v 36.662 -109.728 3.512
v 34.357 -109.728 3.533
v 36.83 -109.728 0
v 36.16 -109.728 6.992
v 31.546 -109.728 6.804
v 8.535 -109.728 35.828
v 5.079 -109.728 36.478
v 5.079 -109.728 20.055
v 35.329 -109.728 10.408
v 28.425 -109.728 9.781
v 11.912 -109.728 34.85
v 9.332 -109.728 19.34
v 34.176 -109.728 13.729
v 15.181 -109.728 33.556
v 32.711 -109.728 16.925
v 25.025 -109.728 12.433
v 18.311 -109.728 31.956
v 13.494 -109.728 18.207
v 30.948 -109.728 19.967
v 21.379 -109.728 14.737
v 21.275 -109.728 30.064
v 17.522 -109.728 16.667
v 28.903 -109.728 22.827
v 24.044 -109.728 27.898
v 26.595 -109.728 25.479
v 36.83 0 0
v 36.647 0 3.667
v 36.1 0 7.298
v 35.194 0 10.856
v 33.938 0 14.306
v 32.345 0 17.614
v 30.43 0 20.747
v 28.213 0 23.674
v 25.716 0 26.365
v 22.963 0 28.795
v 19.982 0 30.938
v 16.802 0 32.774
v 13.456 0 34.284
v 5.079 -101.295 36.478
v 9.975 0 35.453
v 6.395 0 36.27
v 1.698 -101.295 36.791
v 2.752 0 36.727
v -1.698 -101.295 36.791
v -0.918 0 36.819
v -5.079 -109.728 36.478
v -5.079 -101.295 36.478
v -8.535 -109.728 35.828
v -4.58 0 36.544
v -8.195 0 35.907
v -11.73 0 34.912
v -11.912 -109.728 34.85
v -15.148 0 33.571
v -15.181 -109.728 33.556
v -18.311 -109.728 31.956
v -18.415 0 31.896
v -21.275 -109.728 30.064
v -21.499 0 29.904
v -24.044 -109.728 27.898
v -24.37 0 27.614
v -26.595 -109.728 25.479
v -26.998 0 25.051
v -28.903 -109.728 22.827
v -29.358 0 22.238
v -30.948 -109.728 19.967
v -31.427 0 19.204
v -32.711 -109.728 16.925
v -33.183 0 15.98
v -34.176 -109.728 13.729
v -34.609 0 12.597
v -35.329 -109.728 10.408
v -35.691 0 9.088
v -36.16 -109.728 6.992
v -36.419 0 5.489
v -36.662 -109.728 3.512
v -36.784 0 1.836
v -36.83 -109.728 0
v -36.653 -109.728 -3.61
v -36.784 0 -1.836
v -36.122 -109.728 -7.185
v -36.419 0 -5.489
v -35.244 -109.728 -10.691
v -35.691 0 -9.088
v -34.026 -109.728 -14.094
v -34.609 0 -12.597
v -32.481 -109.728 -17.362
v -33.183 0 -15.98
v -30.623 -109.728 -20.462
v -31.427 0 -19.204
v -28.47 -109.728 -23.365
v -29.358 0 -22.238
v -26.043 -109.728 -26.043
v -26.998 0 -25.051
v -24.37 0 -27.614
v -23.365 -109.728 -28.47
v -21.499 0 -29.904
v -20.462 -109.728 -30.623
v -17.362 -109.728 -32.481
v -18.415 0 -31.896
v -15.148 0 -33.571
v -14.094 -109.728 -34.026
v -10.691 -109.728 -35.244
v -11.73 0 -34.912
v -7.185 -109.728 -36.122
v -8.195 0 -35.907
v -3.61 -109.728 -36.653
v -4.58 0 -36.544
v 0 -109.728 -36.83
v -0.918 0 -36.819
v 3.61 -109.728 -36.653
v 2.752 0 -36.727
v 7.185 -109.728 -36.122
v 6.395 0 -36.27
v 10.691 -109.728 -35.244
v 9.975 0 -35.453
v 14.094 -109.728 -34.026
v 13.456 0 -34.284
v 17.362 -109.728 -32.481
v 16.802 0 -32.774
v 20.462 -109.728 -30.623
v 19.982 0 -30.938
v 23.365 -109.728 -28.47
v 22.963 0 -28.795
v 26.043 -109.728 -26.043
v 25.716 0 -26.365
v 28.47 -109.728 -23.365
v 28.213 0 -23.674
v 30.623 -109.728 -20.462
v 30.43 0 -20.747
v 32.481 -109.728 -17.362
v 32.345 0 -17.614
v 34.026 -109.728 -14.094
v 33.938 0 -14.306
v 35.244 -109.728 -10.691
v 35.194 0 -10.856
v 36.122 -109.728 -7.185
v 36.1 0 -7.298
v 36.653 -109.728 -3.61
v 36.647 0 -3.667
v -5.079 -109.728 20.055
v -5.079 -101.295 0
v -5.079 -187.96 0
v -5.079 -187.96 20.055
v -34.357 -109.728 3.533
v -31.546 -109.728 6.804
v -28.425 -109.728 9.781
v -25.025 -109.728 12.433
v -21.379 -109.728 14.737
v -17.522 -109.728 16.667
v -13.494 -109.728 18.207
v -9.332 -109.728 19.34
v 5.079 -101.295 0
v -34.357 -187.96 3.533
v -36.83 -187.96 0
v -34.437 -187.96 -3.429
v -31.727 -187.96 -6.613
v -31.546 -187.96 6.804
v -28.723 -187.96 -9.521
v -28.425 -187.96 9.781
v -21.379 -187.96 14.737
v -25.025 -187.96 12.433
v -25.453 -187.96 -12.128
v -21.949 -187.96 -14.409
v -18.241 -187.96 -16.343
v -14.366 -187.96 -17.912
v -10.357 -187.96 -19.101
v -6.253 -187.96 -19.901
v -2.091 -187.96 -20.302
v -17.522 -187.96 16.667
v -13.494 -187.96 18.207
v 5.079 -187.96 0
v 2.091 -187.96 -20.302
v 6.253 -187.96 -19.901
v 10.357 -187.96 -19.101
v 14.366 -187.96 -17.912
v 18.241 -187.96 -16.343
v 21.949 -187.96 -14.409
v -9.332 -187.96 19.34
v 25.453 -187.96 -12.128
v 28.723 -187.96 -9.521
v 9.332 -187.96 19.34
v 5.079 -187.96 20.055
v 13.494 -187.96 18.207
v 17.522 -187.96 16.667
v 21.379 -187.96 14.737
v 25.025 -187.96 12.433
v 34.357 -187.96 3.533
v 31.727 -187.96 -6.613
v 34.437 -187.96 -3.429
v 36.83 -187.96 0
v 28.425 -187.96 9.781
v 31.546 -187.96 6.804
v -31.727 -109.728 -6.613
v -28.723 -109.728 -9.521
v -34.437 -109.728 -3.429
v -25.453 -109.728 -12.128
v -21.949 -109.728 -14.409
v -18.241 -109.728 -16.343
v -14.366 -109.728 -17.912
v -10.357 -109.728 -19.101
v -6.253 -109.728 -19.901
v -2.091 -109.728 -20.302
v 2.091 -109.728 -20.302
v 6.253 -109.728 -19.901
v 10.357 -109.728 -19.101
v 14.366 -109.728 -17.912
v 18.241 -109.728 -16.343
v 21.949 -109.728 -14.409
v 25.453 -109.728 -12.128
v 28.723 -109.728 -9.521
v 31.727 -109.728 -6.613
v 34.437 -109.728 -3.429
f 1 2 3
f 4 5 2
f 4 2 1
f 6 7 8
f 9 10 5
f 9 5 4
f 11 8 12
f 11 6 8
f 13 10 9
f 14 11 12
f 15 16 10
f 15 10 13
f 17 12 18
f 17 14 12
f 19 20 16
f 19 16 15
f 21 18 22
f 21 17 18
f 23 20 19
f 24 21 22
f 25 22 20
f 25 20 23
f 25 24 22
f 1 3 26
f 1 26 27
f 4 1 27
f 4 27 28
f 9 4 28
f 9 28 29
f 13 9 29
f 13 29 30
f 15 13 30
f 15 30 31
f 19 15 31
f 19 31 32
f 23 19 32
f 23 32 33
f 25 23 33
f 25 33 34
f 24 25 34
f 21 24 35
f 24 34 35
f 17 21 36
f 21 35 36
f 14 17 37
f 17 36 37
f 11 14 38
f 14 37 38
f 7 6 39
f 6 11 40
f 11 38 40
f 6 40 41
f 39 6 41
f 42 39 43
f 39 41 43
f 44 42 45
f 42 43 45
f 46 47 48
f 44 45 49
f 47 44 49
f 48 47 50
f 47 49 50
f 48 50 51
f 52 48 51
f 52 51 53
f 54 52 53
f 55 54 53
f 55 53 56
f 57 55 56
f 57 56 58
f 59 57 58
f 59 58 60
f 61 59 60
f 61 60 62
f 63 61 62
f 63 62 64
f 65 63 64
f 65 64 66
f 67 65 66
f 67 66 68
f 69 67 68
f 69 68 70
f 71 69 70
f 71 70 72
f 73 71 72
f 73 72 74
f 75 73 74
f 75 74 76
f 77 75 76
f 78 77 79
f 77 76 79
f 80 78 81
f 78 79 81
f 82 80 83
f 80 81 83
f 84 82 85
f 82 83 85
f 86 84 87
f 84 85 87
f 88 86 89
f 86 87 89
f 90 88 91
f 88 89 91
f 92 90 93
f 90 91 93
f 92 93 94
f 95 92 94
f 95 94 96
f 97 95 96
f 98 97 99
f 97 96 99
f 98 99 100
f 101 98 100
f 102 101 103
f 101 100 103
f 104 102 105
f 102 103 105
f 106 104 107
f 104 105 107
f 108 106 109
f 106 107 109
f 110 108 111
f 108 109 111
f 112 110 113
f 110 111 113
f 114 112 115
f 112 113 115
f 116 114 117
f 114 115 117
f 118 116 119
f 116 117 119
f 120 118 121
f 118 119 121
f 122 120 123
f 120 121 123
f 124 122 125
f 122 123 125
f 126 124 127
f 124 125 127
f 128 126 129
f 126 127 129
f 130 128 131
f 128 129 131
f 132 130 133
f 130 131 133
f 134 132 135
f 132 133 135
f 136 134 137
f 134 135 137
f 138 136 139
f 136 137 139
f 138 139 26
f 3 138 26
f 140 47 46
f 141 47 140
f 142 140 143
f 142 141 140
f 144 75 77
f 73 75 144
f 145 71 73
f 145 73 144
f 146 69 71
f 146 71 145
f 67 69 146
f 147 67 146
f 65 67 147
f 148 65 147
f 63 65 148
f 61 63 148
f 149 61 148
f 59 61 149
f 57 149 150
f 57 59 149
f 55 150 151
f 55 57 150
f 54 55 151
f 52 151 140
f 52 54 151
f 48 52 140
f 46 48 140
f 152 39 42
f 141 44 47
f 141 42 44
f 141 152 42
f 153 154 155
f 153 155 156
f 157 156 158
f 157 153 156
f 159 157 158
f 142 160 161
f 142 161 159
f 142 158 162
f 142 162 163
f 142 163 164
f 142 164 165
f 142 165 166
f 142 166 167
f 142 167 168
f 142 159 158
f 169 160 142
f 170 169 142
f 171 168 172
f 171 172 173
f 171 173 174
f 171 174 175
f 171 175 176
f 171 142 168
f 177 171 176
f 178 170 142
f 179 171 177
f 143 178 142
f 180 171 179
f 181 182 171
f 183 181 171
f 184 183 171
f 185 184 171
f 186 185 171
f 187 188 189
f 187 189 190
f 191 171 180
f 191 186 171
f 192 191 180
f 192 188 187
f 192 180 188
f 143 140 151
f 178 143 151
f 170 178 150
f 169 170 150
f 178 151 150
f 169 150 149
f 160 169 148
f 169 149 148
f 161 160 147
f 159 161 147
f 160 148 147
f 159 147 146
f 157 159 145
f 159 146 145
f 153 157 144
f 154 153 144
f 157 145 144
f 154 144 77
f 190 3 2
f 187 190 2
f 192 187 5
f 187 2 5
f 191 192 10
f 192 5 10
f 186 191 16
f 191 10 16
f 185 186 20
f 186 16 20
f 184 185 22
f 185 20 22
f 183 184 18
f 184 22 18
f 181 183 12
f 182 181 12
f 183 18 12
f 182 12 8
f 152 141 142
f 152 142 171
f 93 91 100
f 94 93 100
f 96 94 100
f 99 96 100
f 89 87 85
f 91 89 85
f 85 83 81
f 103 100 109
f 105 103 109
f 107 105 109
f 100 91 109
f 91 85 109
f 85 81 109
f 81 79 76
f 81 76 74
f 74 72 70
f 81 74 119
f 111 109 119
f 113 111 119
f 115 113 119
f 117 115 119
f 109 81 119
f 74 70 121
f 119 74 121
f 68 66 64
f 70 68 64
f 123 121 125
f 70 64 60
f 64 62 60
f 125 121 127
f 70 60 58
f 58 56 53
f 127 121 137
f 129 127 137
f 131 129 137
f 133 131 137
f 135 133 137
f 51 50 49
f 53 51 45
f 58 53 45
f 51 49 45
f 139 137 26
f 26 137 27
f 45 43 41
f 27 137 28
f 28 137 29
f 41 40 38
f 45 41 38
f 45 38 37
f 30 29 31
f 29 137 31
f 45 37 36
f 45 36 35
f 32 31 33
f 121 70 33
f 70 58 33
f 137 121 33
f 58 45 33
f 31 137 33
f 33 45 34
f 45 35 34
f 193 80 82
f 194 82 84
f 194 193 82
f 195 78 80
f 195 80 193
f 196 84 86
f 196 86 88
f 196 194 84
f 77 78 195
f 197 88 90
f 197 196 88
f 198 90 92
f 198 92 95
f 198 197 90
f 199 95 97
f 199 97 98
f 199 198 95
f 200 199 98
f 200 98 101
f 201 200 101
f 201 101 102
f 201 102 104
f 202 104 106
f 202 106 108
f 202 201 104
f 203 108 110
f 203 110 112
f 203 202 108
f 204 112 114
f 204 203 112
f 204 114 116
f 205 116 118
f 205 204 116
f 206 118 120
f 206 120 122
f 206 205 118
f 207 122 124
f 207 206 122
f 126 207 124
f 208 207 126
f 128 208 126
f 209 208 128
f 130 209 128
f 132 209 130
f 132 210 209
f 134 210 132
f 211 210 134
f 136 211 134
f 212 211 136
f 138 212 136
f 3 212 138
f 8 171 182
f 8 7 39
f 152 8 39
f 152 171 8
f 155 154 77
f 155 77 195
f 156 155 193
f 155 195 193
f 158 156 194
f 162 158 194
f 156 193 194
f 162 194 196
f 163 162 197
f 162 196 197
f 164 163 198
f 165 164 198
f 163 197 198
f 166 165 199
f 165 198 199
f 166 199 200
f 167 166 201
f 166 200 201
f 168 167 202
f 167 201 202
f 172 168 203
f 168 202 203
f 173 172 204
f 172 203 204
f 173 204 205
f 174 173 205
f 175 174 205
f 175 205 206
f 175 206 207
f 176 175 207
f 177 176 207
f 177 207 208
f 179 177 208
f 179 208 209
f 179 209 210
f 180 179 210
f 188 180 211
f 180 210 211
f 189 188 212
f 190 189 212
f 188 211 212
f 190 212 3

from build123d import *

# Parameters (mm, degrees)
F0_R     = 36.83
F1_DEPTH = 109.728
F3_DEPTH = 78.232
F5_DEPTH = 36.831


with BuildPart() as f1:
    # F0 (on Front) → F1 (new body)
    with BuildSketch(Plane.XZ):
        Circle(F0_R)
    extrude(amount=F1_DEPTH)

    # F2 (on face) → F3 (join)
    with BuildSketch(Plane.XZ.offset(109.728)):
        with BuildLine():
            ThreePointArc((-36.83, 0), (0, -20.352412), (36.83, 0))
            ThreePointArc((36.83, 0), (0, 20.352412), (-36.83, 0))
        make_face()
    extrude(amount=F3_DEPTH)

    # F4 (on Top) → F5 (cut, through all)
    with BuildSketch(Plane.XY):
        Polygon((-5.079485, -101.294816), (-5.079485, -189.798206), (0, -189.798206), (5.079485, -189.798206), (5.079485, -101.294816), align=None)
    extrude(amount=F5_DEPTH, mode=Mode.SUBTRACT)


solid = f1.part
